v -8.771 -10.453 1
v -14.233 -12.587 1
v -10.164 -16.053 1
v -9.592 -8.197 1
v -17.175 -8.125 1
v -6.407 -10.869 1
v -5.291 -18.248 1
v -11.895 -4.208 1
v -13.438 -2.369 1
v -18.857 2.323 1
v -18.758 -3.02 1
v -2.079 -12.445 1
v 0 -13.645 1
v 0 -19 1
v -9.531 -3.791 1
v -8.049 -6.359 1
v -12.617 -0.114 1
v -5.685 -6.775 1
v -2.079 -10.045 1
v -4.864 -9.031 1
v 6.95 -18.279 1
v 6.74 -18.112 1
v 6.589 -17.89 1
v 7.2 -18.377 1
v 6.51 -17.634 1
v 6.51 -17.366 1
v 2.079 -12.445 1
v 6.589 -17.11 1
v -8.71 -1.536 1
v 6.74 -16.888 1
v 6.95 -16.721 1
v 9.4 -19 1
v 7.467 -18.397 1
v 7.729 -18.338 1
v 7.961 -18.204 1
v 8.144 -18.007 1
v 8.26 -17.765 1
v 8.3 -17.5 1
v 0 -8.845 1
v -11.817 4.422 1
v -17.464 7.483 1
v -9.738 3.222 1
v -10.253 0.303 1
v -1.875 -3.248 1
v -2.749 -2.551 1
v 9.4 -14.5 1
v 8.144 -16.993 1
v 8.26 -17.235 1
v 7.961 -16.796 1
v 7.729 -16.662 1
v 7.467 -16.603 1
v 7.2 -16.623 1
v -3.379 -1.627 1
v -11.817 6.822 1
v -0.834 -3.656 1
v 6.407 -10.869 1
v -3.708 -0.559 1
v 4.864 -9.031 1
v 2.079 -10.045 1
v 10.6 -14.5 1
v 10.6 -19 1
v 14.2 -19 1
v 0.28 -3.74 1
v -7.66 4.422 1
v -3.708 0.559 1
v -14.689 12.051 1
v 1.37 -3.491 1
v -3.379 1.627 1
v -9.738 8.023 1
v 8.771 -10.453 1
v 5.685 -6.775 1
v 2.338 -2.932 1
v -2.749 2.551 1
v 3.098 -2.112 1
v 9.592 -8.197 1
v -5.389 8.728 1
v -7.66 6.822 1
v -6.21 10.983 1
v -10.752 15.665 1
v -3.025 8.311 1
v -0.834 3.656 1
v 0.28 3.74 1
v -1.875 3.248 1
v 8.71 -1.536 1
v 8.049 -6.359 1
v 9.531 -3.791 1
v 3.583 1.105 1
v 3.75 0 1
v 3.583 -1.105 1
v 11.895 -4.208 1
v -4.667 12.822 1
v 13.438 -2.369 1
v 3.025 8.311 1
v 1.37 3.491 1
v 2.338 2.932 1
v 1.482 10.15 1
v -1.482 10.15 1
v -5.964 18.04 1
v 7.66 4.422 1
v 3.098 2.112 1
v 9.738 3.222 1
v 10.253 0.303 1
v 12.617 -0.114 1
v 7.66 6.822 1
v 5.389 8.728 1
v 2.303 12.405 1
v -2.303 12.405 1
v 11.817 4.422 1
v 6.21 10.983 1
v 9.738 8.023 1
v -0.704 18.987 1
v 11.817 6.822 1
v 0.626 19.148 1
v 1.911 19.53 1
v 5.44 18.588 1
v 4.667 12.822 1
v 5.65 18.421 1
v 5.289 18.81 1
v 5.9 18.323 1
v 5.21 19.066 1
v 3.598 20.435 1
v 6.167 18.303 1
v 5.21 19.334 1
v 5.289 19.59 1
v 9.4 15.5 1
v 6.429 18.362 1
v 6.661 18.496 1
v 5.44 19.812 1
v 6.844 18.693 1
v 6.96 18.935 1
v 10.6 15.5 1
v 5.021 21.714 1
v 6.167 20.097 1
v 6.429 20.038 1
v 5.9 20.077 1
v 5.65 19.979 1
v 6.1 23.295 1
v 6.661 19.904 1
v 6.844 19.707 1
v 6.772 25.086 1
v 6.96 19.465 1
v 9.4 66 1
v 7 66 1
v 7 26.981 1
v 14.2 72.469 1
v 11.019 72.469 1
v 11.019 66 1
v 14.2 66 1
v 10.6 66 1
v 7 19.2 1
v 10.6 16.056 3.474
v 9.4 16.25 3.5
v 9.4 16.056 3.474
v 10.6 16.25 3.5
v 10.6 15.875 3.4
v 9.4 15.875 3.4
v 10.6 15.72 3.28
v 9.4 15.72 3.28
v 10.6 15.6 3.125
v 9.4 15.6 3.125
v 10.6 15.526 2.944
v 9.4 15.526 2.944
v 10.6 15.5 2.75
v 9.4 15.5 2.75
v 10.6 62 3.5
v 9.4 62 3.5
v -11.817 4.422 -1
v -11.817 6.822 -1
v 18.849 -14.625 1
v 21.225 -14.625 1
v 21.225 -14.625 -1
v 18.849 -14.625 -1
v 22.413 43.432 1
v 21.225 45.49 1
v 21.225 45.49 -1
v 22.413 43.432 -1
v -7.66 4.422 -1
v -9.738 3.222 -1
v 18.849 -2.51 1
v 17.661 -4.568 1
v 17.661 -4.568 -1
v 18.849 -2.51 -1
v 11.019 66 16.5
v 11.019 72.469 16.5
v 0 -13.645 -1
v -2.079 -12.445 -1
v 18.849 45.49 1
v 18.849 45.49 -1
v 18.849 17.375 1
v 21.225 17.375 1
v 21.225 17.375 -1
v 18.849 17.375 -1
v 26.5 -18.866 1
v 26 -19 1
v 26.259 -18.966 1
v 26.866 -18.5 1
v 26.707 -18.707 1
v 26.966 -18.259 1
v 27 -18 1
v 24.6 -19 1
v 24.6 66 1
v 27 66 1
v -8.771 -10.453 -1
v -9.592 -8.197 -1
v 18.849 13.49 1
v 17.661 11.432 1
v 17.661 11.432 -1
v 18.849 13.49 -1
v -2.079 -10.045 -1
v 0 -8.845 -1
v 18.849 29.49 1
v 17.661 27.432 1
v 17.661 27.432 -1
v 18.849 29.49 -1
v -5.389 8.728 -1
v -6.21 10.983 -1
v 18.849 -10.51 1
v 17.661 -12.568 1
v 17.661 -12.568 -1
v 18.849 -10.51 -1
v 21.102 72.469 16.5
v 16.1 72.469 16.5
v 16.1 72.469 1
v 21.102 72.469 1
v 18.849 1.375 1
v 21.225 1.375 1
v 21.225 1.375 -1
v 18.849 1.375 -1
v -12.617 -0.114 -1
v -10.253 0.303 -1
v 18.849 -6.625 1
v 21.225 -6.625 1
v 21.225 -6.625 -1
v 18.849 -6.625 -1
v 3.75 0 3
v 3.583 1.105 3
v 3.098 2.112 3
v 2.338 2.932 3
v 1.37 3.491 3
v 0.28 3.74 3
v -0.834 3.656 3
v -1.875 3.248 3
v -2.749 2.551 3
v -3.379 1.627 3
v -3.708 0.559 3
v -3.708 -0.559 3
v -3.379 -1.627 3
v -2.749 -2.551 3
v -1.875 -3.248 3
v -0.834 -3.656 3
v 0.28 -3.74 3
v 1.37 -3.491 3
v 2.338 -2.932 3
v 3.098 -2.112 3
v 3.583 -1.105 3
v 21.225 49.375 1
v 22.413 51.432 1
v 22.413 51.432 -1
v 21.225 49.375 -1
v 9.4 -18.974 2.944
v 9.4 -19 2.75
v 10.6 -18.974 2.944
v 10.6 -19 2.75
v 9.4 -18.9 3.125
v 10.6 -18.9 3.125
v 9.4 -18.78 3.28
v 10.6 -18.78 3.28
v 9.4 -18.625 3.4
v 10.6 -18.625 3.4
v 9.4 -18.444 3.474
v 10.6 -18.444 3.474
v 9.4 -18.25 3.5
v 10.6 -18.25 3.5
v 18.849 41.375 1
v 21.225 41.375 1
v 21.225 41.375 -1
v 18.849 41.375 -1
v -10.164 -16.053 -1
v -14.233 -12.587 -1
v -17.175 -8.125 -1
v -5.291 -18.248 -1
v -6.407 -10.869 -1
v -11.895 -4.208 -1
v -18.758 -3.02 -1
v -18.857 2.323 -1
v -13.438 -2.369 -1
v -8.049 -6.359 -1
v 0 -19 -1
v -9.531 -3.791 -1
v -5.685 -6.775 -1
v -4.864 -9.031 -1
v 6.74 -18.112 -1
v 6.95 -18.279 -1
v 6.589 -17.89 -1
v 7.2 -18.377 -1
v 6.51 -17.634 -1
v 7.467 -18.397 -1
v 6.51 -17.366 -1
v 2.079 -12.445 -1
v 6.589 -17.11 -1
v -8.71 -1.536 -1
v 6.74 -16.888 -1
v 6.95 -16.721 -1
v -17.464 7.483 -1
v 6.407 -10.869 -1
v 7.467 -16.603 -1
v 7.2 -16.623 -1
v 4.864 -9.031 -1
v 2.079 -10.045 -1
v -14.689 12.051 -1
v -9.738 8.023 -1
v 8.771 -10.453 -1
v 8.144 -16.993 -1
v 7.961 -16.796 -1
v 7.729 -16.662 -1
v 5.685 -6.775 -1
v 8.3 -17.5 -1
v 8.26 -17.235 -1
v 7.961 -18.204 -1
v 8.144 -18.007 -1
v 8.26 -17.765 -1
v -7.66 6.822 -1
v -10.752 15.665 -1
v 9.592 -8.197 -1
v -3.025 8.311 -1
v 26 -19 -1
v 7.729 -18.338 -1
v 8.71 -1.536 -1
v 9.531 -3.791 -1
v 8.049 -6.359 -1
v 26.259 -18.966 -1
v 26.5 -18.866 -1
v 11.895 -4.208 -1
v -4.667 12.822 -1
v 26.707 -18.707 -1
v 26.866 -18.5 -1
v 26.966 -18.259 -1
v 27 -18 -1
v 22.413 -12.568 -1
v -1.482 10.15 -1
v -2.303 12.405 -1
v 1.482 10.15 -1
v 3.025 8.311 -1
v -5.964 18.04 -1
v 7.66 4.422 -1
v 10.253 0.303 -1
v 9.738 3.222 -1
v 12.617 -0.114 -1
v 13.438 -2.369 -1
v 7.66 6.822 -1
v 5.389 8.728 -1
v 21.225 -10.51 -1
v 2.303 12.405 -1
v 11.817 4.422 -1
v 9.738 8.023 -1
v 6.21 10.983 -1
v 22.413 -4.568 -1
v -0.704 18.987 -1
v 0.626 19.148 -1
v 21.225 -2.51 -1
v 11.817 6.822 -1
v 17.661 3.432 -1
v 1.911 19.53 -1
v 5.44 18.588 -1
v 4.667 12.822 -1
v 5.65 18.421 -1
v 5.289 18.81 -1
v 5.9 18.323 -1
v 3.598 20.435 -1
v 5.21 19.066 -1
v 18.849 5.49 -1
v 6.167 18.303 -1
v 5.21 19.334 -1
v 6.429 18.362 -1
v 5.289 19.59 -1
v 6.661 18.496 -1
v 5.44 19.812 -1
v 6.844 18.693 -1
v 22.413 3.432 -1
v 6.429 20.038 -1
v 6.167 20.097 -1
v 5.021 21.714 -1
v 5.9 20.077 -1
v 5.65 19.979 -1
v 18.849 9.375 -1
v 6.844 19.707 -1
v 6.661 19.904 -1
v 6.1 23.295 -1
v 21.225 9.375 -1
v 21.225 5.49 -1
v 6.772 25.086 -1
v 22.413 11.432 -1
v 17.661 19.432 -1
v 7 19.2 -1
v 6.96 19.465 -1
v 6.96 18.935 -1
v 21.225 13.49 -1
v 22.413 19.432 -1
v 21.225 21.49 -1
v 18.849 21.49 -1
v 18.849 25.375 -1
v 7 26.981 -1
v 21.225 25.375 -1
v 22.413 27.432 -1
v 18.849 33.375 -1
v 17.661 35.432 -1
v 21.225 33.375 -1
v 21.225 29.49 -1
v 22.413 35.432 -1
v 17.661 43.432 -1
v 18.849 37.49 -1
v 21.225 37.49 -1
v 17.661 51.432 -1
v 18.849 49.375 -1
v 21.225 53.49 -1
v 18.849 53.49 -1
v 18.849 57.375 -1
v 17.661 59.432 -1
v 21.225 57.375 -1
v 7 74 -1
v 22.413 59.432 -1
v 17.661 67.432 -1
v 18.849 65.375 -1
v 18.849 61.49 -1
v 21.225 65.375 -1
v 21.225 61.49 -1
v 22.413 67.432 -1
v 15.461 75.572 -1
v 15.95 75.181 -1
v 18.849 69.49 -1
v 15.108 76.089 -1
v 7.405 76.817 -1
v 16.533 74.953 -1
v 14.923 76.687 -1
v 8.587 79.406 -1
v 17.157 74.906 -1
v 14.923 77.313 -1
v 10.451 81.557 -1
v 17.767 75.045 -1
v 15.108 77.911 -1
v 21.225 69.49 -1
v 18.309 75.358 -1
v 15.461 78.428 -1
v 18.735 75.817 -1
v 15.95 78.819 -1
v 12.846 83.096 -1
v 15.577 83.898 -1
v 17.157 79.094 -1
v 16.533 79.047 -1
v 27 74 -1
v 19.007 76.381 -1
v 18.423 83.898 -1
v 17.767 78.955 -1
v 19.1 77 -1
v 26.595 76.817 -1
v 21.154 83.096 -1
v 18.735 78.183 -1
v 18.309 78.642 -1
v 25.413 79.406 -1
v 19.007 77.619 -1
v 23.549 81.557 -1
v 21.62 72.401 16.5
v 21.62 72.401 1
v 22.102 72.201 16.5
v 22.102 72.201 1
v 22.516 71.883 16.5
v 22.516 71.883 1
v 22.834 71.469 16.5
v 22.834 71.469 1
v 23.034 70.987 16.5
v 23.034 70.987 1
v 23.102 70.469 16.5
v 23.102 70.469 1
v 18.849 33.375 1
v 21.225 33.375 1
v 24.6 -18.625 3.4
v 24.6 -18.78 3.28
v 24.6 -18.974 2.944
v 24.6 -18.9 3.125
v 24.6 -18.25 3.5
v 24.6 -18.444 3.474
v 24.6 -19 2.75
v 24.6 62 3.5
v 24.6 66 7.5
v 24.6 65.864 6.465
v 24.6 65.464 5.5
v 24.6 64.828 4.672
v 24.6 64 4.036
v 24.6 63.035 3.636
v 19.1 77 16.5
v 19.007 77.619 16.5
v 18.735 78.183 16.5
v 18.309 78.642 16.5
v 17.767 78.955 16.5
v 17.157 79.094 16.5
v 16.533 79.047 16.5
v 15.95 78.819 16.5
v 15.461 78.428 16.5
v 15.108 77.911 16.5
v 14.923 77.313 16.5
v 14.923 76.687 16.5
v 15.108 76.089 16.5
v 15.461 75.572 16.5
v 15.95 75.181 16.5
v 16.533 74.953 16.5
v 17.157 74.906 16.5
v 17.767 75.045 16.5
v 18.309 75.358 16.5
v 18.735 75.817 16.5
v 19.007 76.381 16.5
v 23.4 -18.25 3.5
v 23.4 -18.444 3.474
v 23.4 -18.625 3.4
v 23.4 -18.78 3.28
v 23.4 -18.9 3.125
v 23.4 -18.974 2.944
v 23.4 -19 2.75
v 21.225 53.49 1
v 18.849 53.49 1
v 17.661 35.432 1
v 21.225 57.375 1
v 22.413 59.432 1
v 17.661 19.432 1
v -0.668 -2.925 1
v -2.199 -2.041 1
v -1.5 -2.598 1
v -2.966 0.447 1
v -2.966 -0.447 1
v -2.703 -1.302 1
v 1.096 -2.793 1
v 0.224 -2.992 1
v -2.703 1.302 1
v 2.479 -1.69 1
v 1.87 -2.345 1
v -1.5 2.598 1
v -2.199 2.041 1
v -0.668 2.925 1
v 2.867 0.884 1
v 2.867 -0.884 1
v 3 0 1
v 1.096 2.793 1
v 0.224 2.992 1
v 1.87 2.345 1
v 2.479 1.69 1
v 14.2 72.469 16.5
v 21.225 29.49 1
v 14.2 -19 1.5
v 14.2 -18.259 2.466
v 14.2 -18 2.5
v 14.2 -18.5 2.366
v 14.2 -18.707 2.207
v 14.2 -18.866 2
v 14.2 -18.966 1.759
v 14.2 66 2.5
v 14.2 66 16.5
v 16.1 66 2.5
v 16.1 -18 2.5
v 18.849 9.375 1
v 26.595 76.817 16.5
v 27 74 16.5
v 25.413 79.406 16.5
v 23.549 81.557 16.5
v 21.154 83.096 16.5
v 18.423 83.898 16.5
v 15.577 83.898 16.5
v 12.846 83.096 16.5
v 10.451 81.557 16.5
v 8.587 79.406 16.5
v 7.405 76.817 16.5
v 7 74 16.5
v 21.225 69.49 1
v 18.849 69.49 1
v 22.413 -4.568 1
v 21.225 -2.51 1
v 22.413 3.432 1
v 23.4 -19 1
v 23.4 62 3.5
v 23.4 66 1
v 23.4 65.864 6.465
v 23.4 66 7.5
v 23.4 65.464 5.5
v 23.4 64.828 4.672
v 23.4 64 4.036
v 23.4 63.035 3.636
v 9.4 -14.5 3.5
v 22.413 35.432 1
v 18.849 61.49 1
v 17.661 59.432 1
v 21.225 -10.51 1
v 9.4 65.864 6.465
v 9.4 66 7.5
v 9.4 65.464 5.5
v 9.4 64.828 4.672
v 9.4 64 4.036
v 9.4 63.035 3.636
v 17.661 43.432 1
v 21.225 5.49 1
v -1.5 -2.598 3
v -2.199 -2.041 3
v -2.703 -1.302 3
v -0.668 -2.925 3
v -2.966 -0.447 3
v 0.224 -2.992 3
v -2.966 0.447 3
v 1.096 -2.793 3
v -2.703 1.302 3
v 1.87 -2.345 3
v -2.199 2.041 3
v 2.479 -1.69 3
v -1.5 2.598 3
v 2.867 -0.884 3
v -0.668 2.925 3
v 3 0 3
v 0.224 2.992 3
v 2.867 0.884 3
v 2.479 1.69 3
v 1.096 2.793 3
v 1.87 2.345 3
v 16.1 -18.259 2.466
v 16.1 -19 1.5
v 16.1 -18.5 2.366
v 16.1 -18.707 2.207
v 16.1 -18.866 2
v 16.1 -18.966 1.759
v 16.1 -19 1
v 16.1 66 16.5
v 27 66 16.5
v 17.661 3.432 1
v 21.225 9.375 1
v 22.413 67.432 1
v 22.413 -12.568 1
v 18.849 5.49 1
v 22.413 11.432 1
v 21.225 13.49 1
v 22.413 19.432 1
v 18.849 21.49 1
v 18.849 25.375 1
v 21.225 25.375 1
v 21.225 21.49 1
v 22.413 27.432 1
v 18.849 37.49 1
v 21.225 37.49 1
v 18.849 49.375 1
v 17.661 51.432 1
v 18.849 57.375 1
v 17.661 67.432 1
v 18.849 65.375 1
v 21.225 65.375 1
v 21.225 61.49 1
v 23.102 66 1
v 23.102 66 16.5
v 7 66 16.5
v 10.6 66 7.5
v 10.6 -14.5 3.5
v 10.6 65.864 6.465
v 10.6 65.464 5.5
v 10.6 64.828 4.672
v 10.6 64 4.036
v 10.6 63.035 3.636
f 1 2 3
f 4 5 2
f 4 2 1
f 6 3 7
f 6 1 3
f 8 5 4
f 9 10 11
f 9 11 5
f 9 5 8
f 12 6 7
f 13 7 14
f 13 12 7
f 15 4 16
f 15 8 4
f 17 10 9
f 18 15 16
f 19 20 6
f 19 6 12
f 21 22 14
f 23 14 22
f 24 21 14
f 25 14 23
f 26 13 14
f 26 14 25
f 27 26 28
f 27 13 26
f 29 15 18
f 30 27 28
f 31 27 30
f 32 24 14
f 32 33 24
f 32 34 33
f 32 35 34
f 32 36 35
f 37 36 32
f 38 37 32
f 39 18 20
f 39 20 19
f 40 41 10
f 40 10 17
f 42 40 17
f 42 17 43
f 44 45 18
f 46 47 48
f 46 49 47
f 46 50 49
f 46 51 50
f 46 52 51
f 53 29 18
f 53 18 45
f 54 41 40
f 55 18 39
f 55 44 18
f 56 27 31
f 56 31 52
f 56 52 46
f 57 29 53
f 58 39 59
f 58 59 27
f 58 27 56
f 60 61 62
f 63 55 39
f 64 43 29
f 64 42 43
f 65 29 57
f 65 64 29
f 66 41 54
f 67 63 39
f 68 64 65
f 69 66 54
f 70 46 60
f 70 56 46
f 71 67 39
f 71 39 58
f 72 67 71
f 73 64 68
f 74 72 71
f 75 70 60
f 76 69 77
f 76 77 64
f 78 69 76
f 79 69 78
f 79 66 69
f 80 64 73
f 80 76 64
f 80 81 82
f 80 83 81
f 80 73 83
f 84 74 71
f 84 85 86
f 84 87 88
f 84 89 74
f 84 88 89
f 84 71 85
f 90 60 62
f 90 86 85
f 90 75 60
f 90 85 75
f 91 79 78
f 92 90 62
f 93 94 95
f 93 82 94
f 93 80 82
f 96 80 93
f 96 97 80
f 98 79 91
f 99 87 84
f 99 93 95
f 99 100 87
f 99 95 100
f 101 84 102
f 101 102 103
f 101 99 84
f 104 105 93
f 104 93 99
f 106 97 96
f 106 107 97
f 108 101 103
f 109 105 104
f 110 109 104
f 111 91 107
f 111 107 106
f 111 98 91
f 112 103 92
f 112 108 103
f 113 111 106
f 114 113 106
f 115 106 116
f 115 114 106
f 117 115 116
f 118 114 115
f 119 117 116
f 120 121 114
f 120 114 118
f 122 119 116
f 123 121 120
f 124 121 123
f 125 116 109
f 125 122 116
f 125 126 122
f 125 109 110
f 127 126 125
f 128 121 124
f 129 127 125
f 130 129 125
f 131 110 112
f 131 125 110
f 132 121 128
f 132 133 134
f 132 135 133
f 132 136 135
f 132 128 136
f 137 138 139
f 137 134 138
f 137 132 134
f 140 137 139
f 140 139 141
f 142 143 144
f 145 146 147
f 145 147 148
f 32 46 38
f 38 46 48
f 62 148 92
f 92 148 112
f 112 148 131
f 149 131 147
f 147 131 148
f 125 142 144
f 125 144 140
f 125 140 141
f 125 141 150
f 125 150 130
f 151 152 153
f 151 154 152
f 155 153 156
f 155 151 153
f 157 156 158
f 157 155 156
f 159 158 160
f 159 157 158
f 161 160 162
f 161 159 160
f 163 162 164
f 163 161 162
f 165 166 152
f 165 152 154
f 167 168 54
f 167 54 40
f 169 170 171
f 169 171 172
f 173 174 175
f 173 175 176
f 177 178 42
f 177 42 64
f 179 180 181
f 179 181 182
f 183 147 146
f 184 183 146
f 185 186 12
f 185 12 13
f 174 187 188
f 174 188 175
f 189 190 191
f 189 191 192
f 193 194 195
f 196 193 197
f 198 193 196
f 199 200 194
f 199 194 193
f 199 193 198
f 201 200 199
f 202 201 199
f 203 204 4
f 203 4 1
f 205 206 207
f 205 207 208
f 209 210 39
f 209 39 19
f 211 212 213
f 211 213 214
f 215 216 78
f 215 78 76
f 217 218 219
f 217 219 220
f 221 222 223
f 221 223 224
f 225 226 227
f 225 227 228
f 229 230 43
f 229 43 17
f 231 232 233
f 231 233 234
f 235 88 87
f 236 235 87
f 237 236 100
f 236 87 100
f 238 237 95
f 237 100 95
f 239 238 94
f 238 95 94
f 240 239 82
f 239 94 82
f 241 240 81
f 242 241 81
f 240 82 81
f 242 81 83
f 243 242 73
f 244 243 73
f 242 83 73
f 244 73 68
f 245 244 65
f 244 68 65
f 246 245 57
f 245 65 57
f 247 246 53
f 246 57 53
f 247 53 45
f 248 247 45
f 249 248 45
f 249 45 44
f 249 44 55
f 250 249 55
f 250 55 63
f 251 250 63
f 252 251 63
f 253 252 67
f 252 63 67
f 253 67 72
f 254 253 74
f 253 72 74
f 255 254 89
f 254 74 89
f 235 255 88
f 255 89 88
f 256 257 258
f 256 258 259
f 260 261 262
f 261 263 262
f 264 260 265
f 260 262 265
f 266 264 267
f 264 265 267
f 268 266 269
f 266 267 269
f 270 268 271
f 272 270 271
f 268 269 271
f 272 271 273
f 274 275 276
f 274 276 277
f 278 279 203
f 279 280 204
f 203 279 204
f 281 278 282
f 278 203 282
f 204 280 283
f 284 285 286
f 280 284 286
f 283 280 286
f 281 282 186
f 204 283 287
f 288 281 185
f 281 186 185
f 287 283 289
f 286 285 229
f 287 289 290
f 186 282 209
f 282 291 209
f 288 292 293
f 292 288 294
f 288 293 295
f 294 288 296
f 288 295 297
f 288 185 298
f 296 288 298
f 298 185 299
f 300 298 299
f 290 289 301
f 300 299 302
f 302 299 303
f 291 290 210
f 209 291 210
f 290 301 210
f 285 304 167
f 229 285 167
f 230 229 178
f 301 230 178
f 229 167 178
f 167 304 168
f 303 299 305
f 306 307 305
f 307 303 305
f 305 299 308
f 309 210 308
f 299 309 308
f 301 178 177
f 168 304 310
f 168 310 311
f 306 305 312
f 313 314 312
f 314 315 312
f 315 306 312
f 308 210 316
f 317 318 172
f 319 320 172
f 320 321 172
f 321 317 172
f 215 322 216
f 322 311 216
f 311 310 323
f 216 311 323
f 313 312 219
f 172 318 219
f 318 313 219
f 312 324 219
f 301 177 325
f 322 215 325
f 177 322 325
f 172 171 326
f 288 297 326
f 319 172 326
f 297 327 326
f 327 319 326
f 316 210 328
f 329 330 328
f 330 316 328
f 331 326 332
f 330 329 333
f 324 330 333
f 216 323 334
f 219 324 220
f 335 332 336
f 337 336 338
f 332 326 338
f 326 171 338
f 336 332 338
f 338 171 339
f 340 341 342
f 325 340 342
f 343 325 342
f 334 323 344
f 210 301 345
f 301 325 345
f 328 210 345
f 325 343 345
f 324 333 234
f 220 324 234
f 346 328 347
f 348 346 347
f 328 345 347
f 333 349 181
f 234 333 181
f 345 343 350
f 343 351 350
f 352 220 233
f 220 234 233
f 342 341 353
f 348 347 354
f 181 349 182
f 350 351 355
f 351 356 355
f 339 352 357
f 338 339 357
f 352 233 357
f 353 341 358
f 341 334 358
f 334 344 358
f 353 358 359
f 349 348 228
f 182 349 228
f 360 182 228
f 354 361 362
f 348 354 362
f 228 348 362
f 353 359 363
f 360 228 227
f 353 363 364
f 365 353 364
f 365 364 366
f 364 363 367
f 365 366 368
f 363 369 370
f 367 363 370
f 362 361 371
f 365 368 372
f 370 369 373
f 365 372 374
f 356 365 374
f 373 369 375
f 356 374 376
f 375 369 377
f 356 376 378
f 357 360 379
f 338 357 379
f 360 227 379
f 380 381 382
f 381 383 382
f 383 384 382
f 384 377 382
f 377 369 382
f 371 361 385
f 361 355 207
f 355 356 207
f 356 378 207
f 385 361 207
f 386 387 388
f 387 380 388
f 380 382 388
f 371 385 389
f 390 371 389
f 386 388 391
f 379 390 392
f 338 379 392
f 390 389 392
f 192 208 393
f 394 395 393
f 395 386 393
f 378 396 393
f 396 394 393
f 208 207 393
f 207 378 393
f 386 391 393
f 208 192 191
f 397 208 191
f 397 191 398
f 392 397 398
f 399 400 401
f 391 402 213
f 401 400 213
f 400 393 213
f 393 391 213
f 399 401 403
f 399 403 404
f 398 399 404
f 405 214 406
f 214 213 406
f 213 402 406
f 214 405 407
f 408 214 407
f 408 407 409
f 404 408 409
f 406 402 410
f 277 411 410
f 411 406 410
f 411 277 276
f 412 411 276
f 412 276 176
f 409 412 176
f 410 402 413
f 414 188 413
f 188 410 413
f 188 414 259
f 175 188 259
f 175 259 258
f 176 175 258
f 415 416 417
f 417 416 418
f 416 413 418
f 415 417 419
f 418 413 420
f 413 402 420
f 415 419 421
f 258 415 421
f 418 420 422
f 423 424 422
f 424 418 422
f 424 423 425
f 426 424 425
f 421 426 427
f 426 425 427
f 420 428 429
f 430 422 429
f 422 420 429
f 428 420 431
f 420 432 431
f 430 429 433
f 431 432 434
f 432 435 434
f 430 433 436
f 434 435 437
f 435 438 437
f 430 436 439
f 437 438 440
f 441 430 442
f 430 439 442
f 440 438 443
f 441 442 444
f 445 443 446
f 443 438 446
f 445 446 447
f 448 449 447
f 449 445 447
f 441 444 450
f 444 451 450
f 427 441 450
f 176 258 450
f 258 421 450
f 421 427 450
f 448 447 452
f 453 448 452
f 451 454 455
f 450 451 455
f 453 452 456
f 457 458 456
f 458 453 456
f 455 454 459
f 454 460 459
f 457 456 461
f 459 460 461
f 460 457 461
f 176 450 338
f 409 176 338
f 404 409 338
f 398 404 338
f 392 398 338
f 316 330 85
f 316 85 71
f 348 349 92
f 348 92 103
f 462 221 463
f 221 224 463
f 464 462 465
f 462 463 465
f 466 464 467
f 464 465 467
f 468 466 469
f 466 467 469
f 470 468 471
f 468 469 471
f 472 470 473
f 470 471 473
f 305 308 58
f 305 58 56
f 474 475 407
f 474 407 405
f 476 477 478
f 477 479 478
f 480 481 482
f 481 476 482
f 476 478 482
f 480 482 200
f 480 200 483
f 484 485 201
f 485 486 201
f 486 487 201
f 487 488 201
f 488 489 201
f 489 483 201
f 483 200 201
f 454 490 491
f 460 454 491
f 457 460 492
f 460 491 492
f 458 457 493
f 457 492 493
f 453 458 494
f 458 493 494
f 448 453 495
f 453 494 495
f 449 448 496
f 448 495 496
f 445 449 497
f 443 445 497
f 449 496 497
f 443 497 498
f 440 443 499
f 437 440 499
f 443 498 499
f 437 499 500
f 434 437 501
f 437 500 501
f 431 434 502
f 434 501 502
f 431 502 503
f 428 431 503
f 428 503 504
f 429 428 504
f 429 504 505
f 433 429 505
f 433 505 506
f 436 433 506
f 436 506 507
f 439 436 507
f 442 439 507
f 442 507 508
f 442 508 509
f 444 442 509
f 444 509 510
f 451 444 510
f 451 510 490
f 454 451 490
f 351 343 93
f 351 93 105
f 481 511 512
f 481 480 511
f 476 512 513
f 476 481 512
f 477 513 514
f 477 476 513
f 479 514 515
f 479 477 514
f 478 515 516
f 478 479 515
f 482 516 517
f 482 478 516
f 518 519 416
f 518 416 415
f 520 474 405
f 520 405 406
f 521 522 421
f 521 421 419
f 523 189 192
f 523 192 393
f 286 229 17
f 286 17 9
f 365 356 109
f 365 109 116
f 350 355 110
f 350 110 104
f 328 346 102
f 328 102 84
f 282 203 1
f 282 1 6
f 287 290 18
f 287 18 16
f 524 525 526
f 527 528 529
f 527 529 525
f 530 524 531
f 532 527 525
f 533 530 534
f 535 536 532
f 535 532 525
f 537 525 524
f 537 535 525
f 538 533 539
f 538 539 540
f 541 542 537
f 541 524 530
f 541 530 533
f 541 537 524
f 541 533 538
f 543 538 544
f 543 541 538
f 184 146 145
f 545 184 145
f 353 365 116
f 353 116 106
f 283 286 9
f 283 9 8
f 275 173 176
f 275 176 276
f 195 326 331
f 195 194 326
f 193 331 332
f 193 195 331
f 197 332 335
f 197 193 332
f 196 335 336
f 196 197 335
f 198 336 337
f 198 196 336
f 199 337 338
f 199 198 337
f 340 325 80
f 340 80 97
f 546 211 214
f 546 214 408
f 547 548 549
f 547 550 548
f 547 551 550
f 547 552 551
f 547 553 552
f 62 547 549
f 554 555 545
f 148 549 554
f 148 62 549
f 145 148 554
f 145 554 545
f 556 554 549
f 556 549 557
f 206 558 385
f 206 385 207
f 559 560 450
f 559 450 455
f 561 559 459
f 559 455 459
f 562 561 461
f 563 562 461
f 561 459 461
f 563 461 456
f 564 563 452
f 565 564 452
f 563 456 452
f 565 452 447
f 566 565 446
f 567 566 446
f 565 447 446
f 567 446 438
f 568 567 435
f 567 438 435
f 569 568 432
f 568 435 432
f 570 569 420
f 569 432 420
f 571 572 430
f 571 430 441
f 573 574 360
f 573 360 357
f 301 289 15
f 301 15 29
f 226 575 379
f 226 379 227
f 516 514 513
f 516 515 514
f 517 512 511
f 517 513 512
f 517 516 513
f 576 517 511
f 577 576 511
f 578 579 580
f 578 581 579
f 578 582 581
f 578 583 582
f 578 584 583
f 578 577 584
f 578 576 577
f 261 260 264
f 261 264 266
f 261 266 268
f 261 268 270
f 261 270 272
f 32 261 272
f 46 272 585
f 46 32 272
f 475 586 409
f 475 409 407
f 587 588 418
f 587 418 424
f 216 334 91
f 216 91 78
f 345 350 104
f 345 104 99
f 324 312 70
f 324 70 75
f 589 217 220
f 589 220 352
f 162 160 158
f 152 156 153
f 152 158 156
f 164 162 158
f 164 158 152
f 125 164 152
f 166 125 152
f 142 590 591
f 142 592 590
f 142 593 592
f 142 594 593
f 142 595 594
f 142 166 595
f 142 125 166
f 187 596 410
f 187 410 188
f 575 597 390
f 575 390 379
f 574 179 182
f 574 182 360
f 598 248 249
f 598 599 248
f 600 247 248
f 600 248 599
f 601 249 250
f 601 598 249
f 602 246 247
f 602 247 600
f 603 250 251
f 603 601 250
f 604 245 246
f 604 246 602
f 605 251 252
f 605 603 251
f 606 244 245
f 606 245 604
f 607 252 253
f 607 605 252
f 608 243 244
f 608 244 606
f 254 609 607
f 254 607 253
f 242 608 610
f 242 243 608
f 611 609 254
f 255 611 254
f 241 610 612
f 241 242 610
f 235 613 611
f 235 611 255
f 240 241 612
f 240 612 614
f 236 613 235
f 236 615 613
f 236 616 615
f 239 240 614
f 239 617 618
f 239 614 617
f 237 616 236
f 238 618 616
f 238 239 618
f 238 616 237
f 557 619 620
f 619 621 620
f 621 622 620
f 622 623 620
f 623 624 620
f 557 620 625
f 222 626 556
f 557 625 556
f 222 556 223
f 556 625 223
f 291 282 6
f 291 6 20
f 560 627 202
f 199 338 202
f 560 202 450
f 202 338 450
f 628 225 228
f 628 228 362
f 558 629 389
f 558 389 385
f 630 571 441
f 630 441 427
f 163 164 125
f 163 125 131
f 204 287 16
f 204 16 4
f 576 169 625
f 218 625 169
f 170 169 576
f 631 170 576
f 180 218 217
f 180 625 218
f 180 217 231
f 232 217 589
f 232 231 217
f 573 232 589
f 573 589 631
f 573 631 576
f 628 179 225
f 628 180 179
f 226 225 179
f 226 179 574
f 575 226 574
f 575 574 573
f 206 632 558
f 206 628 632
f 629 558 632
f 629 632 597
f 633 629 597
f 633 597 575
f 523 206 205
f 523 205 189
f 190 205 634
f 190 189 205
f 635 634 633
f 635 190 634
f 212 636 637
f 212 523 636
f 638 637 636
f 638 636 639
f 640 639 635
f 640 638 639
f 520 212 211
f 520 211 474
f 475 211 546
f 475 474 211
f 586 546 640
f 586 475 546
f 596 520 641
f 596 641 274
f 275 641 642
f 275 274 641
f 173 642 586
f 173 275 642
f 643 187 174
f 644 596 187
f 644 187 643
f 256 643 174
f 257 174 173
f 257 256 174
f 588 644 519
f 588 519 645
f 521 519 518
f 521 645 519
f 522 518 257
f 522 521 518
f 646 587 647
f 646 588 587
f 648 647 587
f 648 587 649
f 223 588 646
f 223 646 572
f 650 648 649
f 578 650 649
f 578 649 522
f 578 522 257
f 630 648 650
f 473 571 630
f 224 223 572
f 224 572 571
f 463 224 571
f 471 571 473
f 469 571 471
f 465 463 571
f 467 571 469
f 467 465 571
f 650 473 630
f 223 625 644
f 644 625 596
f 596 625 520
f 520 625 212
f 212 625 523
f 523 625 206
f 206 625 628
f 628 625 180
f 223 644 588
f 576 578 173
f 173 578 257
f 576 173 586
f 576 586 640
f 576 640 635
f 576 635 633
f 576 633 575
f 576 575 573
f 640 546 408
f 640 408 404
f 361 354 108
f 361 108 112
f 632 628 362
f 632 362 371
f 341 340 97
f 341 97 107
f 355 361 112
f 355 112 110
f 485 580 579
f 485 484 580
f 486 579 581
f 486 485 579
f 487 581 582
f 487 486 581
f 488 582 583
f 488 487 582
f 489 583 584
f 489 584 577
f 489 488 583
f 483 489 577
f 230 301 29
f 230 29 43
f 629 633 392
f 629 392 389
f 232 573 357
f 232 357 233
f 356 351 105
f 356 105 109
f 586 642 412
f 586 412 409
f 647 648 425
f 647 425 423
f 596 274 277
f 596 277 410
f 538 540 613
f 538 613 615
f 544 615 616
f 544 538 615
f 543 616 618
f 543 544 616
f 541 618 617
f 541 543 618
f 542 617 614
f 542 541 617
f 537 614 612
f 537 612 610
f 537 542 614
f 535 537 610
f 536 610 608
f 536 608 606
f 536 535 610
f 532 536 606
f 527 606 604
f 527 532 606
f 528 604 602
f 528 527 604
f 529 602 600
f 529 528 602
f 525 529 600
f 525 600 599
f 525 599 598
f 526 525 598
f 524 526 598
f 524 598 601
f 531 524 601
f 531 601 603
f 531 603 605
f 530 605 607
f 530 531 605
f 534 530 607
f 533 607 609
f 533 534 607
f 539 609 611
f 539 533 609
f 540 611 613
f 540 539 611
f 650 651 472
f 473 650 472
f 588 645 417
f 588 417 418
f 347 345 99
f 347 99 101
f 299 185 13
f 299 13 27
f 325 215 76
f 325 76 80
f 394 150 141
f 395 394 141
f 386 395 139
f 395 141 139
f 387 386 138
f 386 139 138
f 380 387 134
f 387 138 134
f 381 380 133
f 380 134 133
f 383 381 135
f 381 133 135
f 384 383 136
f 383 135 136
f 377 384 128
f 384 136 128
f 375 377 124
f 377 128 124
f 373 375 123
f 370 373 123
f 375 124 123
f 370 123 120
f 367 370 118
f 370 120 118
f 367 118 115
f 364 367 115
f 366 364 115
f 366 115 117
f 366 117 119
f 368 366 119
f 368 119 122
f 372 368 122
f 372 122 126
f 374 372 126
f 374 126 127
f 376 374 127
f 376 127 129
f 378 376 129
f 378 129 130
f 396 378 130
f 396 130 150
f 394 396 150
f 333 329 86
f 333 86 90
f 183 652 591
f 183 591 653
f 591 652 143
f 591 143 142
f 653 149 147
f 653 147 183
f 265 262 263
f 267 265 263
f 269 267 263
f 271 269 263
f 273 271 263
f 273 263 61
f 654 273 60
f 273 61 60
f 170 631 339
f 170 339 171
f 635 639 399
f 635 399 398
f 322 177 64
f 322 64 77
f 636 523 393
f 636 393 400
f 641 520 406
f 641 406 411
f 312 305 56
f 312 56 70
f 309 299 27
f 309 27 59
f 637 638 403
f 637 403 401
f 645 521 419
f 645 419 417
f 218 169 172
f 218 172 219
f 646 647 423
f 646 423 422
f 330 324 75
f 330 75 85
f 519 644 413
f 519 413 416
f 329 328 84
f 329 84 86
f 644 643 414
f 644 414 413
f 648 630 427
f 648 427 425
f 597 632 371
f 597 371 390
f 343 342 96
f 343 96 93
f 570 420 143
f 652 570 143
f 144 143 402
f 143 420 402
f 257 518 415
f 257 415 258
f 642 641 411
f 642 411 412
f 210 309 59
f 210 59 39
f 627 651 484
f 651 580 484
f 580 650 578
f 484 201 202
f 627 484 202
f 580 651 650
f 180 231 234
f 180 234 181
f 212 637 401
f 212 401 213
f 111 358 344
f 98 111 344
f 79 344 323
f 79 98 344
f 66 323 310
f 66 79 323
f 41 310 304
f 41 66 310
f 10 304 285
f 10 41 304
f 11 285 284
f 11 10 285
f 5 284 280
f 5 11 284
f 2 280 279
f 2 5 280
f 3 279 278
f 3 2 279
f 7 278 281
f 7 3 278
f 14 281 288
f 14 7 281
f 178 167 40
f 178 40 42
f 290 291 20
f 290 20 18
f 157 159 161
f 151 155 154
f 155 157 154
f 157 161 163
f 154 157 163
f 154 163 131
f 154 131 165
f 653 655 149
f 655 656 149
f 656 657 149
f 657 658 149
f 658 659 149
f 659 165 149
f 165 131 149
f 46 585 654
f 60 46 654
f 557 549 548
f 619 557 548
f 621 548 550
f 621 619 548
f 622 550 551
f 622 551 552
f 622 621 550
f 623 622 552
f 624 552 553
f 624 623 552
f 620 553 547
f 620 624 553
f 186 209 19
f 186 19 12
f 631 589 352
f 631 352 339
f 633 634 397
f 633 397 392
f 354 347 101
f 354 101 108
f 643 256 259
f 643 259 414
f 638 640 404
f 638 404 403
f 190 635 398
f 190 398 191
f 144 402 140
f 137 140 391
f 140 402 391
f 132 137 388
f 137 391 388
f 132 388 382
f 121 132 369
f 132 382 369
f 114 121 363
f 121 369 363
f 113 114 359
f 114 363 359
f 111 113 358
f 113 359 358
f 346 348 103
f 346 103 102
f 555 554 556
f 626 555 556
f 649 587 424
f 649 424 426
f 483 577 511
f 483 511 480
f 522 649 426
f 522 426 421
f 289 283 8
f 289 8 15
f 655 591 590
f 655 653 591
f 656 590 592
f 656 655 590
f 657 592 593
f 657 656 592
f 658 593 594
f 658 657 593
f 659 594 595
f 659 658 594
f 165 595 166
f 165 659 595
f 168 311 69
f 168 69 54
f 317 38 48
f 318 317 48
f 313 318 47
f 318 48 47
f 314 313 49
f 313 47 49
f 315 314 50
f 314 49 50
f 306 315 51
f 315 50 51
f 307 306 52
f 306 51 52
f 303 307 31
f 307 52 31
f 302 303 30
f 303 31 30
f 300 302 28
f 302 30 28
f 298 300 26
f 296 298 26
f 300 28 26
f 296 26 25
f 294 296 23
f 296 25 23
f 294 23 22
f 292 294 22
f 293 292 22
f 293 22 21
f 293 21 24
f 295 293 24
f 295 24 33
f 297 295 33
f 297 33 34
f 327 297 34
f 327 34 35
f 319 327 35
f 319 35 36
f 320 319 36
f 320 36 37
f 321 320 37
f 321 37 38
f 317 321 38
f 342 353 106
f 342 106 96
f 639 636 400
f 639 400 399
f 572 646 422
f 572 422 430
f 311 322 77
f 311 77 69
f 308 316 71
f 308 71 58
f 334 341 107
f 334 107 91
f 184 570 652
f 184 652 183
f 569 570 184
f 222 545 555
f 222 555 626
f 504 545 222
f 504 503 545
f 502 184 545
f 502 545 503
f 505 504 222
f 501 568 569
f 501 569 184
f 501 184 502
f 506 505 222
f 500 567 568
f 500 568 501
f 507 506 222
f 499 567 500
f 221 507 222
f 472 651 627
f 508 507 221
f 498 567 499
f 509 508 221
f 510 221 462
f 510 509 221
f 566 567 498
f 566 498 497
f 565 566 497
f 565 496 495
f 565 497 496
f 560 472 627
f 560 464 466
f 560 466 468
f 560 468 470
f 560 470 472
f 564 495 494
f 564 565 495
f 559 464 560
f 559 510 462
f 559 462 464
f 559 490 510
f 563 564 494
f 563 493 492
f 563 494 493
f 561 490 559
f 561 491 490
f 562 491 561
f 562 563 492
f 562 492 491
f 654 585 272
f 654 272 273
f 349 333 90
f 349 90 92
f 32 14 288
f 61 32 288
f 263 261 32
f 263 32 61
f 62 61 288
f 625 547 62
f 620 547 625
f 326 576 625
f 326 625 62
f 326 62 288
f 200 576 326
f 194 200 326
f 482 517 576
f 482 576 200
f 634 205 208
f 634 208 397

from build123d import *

# Parameters (mm, degrees)
BODYTOP_R                       = 19
BODY_TOP_DEPTH                  = 1
SKIZZE_LAMELLEN_W               = 1.2
SKIZZE_LAMELLEN_H               = 85
LAMMELLEN_DEPTH                 = 2.5
SKIZZE1_W                       = 1.9
SKIZZE1_H                       = 85
FUEHRUNG_DEPTH                  = 1.5
VERRUNDUNG6_R                   = 1
SPARUNG_W                       = 1.2
SPARUNG_H                       = 30
AUSSPARUNG_DEPTH                = 2.5
ANBAUPLATTE_DEPTH               = 1
ANBAUSTUTZEN_DEPTH              = 15.5
SKIZZEDRUCKERZAHNRAD_R          = 3.75
SKIZZEDRUCKERZAHNRAD_R_2        = 3
DRUCKER_ZAHNRAD_DEPTH           = 2
SKIZZEHALTERLOCH_R              = 2.1
HALTERLOCH_DEPTH                = 18.5
VERRUNDUNG24_R                  = 8
SKIZZEBOHRLOCH_R                = 0.9
BOHRLOCH_DEPTH                  = 10
SKIZZE6_W                       = 7.001894066
SKIZZE6_H                       = 6.469061082
SKIZZE6_W_2                     = 3.181141547
SCHNITT_LINEAR_AUSTRAGEN4_DEPTH = 15.5
VERRUNDUNG34_R                  = 1
SCHNITT_LINEAR_START            = -18.5000001
SCHNITT_LINEAR_AUSTRAGEN5_DEPTH = 19.5000002
LINEARES_MUSTER2_COUNT          = 11
LINEARES_MUSTER2_PITCH          = 8
SCHNITT_LINEAR_START_2          = -3.0000001
SCHNITT_LINEAR_AUSTRAGEN6_DEPTH = 19.5000002
KREISMUSTER1_COUNT              = 9
VERRUNDUNG35_R                  = 2
VERRUNDUNG36_R                  = 4
VERRUNDUNG37_R                  = 4
VERRUNDUNG38_R                  = 0.75


with BuildPart() as part:
    # BodyTop → body-top (new body, symmetric)
    with BuildSketch(Plane.XY):
        Circle(BODYTOP_R)
        with BuildLine():
            ThreePointArc((19, 0), (13.435028843, -13.435028843), (0, -19))
            Line((0, -19), (27, -19))
            Line((27, -19), (27, 66))
            Line((27, 66), (7, 66))
            Line((7, 66), (7, 19))
            Line((7, 19), (0, 19))
            ThreePointArc((0, 19), (13.435028843, 13.435028843), (19, 0))
        make_face()
    extrude(amount=BODY_TOP_DEPTH, both=True)

    # skizze_lamellen → Lammellen (add)
    with BuildSketch(Plane.XY.offset(1)):
        with Locations((24, 23.5)):
            Rectangle(SKIZZE_LAMELLEN_W, SKIZZE_LAMELLEN_H)
        with Locations((10, 23.5)):
            Rectangle(SKIZZE_LAMELLEN_W, SKIZZE_LAMELLEN_H)
    extrude(amount=LAMMELLEN_DEPTH)

    # Skizze1 → fuehrung (add)
    with BuildSketch(Plane.XY.offset(1)):
        with Locations((15.15, 23.5)):
            Rectangle(SKIZZE1_W, SKIZZE1_H)
    extrude(amount=FUEHRUNG_DEPTH)

    # Verrundung6
    verrundung6_edges = [part.edges().sort_by_distance(p)[0] for p in [
        (27, -19, 0),
    ]]
    fillet(verrundung6_edges, radius=VERRUNDUNG6_R)

    # sparung → Aussparung (cut)
    with BuildSketch(Plane.XY.offset(3.5)):
        with Locations((10, 0.5)):
            Rectangle(SPARUNG_W, SPARUNG_H)
    extrude(amount=-AUSSPARUNG_DEPTH, mode=Mode.SUBTRACT)

    # SkizzeAnbau → Anbauplatte (add, symmetric)
    with BuildSketch(Plane.XY):
        with BuildLine():
            Line((7, 74), (7, 66))
            Line((7, 66), (27, 66))
            Line((27, 66), (27, 74))
            ThreePointArc((27, 74), (17, 84), (7, 74))
        make_face()
    extrude(amount=ANBAUPLATTE_DEPTH, both=True)

    # SkizzeStutzen → anbaustutzen (add)
    with BuildSketch(Plane.XY.offset(1)):
        with BuildLine():
            Line((7, 66), (27, 66))
            Line((27, 66), (27, 74))
            ThreePointArc((27, 74), (17, 84), (7, 74))
            Line((7, 74), (7, 66))
        make_face()
    extrude(amount=ANBAUSTUTZEN_DEPTH)

    # Skizzedruckerzahnrad → drucker zahnrad (add)
    with BuildSketch(Plane.XY.offset(1)):
        Circle(SKIZZEDRUCKERZAHNRAD_R)
        Circle(SKIZZEDRUCKERZAHNRAD_R_2, mode=Mode.SUBTRACT)
    extrude(amount=DRUCKER_ZAHNRAD_DEPTH)

    # SkizzeHalterloch → halterloch (cut)
    with BuildSketch(Plane.XY.offset(16.5)):
        with Locations((17, 77)):
            Circle(SKIZZEHALTERLOCH_R)
    extrude(amount=-HALTERLOCH_DEPTH, mode=Mode.SUBTRACT)

    # Verrundung24
    verrundung24_edges = [part.edges().sort_by_distance(p)[0] for p in [
        (7, 19, 0),
    ]]
    fillet(verrundung24_edges, radius=VERRUNDUNG24_R)

    # Skizzebohrloch → bohrloch (cut)
    with BuildSketch(Plane.XY.offset(1)):
        with Locations((7.4, -17.5)):
            Circle(SKIZZEBOHRLOCH_R)
        with Locations((6.1, 19.2)):
            Circle(SKIZZEBOHRLOCH_R)
    extrude(amount=-BOHRLOCH_DEPTH, mode=Mode.SUBTRACT)

    # Skizze6 → Schnitt-Linear austragen4 (cut)
    with BuildSketch(Plane.XY.offset(16.5)):
        with Locations((19.600947033, 69.234530541)):
            Rectangle(SKIZZE6_W, SKIZZE6_H)
        with Locations((12.609429227, 69.234530541)):
            Rectangle(SKIZZE6_W_2, SKIZZE6_H)
    extrude(amount=-SCHNITT_LINEAR_AUSTRAGEN4_DEPTH, mode=Mode.SUBTRACT)

    # Verrundung34
    verrundung34_edges = [part.edges().sort_by_distance(p)[0] for p in [
        (15.15, -19, 2.5),
    ]]
    fillet(verrundung34_edges, radius=VERRUNDUNG34_R)

    # Skizze7 → Schnitt-Linear austragen5 (cut)
    with BuildSketch(Plane(origin=(0, 0, -1), x_dir=(-1, 0, 0), z_dir=(0, 0, -1)).offset(SCHNITT_LINEAR_START)):
        Polygon((-22.413127148, -12.56760803), (-21.225184268, -14.625185455), (-18.849298507, -14.625185455), (-17.661355626, -12.56760803), (-18.849298507, -10.510030604), (-21.225184268, -10.510030604), align=None)
    schnitt_linear_austragen5 = extrude(amount=SCHNITT_LINEAR_AUSTRAGEN5_DEPTH, mode=Mode.SUBTRACT)

    # Lineares Muster2: Schnitt-Linear austragen5 ×11
    with Locations(*[(0, i * LINEARES_MUSTER2_PITCH, 0) for i in range(1, LINEARES_MUSTER2_COUNT)]):
        add(schnitt_linear_austragen5, mode=Mode.SUBTRACT)

    # Skizze8 → Schnitt-Linear austragen6 (cut)
    with BuildSketch(Plane.XY.offset(1).offset(SCHNITT_LINEAR_START_2)):
        Polygon((0, -8.844754272), (-2.078547165, -10.044804037), (-2.078547165, -12.444903567), (0, -13.644953333), (2.078547165, -12.444903567), (2.078547165, -10.044804037), align=None)
    schnitt_linear_austragen6 = extrude(amount=SCHNITT_LINEAR_AUSTRAGEN6_DEPTH, mode=Mode.SUBTRACT)

    # Kreismuster1: Schnitt-Linear austragen6 ×9 about axis
    kreismuster1_axis = Axis((0, 0, 0), (0, 0, 1))
    for i in range(1, KREISMUSTER1_COUNT):
        add(schnitt_linear_austragen6.rotate(kreismuster1_axis, i * 360 / KREISMUSTER1_COUNT), mode=Mode.SUBTRACT)

    # Verrundung35
    verrundung35_edges = [part.edges().sort_by_distance(p)[0] for p in [
        (23.101894066, 72.469061082, 8.75),
    ]]
    fillet(verrundung35_edges, radius=VERRUNDUNG35_R)

    # Verrundung36
    verrundung36_edges = [part.edges().sort_by_distance(p)[0] for p in [
        (10, 66, 3.5),
    ]]
    fillet(verrundung36_edges, radius=VERRUNDUNG36_R)

    # Verrundung37
    verrundung37_edges = [part.edges().sort_by_distance(p)[0] for p in [
        (24, 66, 3.5),
    ]]
    fillet(verrundung37_edges, radius=VERRUNDUNG37_R)

    # Verrundung38
    verrundung38_edges = [part.edges().sort_by_distance(p)[0] for p in [
        (10, 15.5, 3.5),
        (10, -19, 3.5),
        (24, -19, 3.5),
    ]]
    fillet(verrundung38_edges, radius=VERRUNDUNG38_R)


solid = part.part
